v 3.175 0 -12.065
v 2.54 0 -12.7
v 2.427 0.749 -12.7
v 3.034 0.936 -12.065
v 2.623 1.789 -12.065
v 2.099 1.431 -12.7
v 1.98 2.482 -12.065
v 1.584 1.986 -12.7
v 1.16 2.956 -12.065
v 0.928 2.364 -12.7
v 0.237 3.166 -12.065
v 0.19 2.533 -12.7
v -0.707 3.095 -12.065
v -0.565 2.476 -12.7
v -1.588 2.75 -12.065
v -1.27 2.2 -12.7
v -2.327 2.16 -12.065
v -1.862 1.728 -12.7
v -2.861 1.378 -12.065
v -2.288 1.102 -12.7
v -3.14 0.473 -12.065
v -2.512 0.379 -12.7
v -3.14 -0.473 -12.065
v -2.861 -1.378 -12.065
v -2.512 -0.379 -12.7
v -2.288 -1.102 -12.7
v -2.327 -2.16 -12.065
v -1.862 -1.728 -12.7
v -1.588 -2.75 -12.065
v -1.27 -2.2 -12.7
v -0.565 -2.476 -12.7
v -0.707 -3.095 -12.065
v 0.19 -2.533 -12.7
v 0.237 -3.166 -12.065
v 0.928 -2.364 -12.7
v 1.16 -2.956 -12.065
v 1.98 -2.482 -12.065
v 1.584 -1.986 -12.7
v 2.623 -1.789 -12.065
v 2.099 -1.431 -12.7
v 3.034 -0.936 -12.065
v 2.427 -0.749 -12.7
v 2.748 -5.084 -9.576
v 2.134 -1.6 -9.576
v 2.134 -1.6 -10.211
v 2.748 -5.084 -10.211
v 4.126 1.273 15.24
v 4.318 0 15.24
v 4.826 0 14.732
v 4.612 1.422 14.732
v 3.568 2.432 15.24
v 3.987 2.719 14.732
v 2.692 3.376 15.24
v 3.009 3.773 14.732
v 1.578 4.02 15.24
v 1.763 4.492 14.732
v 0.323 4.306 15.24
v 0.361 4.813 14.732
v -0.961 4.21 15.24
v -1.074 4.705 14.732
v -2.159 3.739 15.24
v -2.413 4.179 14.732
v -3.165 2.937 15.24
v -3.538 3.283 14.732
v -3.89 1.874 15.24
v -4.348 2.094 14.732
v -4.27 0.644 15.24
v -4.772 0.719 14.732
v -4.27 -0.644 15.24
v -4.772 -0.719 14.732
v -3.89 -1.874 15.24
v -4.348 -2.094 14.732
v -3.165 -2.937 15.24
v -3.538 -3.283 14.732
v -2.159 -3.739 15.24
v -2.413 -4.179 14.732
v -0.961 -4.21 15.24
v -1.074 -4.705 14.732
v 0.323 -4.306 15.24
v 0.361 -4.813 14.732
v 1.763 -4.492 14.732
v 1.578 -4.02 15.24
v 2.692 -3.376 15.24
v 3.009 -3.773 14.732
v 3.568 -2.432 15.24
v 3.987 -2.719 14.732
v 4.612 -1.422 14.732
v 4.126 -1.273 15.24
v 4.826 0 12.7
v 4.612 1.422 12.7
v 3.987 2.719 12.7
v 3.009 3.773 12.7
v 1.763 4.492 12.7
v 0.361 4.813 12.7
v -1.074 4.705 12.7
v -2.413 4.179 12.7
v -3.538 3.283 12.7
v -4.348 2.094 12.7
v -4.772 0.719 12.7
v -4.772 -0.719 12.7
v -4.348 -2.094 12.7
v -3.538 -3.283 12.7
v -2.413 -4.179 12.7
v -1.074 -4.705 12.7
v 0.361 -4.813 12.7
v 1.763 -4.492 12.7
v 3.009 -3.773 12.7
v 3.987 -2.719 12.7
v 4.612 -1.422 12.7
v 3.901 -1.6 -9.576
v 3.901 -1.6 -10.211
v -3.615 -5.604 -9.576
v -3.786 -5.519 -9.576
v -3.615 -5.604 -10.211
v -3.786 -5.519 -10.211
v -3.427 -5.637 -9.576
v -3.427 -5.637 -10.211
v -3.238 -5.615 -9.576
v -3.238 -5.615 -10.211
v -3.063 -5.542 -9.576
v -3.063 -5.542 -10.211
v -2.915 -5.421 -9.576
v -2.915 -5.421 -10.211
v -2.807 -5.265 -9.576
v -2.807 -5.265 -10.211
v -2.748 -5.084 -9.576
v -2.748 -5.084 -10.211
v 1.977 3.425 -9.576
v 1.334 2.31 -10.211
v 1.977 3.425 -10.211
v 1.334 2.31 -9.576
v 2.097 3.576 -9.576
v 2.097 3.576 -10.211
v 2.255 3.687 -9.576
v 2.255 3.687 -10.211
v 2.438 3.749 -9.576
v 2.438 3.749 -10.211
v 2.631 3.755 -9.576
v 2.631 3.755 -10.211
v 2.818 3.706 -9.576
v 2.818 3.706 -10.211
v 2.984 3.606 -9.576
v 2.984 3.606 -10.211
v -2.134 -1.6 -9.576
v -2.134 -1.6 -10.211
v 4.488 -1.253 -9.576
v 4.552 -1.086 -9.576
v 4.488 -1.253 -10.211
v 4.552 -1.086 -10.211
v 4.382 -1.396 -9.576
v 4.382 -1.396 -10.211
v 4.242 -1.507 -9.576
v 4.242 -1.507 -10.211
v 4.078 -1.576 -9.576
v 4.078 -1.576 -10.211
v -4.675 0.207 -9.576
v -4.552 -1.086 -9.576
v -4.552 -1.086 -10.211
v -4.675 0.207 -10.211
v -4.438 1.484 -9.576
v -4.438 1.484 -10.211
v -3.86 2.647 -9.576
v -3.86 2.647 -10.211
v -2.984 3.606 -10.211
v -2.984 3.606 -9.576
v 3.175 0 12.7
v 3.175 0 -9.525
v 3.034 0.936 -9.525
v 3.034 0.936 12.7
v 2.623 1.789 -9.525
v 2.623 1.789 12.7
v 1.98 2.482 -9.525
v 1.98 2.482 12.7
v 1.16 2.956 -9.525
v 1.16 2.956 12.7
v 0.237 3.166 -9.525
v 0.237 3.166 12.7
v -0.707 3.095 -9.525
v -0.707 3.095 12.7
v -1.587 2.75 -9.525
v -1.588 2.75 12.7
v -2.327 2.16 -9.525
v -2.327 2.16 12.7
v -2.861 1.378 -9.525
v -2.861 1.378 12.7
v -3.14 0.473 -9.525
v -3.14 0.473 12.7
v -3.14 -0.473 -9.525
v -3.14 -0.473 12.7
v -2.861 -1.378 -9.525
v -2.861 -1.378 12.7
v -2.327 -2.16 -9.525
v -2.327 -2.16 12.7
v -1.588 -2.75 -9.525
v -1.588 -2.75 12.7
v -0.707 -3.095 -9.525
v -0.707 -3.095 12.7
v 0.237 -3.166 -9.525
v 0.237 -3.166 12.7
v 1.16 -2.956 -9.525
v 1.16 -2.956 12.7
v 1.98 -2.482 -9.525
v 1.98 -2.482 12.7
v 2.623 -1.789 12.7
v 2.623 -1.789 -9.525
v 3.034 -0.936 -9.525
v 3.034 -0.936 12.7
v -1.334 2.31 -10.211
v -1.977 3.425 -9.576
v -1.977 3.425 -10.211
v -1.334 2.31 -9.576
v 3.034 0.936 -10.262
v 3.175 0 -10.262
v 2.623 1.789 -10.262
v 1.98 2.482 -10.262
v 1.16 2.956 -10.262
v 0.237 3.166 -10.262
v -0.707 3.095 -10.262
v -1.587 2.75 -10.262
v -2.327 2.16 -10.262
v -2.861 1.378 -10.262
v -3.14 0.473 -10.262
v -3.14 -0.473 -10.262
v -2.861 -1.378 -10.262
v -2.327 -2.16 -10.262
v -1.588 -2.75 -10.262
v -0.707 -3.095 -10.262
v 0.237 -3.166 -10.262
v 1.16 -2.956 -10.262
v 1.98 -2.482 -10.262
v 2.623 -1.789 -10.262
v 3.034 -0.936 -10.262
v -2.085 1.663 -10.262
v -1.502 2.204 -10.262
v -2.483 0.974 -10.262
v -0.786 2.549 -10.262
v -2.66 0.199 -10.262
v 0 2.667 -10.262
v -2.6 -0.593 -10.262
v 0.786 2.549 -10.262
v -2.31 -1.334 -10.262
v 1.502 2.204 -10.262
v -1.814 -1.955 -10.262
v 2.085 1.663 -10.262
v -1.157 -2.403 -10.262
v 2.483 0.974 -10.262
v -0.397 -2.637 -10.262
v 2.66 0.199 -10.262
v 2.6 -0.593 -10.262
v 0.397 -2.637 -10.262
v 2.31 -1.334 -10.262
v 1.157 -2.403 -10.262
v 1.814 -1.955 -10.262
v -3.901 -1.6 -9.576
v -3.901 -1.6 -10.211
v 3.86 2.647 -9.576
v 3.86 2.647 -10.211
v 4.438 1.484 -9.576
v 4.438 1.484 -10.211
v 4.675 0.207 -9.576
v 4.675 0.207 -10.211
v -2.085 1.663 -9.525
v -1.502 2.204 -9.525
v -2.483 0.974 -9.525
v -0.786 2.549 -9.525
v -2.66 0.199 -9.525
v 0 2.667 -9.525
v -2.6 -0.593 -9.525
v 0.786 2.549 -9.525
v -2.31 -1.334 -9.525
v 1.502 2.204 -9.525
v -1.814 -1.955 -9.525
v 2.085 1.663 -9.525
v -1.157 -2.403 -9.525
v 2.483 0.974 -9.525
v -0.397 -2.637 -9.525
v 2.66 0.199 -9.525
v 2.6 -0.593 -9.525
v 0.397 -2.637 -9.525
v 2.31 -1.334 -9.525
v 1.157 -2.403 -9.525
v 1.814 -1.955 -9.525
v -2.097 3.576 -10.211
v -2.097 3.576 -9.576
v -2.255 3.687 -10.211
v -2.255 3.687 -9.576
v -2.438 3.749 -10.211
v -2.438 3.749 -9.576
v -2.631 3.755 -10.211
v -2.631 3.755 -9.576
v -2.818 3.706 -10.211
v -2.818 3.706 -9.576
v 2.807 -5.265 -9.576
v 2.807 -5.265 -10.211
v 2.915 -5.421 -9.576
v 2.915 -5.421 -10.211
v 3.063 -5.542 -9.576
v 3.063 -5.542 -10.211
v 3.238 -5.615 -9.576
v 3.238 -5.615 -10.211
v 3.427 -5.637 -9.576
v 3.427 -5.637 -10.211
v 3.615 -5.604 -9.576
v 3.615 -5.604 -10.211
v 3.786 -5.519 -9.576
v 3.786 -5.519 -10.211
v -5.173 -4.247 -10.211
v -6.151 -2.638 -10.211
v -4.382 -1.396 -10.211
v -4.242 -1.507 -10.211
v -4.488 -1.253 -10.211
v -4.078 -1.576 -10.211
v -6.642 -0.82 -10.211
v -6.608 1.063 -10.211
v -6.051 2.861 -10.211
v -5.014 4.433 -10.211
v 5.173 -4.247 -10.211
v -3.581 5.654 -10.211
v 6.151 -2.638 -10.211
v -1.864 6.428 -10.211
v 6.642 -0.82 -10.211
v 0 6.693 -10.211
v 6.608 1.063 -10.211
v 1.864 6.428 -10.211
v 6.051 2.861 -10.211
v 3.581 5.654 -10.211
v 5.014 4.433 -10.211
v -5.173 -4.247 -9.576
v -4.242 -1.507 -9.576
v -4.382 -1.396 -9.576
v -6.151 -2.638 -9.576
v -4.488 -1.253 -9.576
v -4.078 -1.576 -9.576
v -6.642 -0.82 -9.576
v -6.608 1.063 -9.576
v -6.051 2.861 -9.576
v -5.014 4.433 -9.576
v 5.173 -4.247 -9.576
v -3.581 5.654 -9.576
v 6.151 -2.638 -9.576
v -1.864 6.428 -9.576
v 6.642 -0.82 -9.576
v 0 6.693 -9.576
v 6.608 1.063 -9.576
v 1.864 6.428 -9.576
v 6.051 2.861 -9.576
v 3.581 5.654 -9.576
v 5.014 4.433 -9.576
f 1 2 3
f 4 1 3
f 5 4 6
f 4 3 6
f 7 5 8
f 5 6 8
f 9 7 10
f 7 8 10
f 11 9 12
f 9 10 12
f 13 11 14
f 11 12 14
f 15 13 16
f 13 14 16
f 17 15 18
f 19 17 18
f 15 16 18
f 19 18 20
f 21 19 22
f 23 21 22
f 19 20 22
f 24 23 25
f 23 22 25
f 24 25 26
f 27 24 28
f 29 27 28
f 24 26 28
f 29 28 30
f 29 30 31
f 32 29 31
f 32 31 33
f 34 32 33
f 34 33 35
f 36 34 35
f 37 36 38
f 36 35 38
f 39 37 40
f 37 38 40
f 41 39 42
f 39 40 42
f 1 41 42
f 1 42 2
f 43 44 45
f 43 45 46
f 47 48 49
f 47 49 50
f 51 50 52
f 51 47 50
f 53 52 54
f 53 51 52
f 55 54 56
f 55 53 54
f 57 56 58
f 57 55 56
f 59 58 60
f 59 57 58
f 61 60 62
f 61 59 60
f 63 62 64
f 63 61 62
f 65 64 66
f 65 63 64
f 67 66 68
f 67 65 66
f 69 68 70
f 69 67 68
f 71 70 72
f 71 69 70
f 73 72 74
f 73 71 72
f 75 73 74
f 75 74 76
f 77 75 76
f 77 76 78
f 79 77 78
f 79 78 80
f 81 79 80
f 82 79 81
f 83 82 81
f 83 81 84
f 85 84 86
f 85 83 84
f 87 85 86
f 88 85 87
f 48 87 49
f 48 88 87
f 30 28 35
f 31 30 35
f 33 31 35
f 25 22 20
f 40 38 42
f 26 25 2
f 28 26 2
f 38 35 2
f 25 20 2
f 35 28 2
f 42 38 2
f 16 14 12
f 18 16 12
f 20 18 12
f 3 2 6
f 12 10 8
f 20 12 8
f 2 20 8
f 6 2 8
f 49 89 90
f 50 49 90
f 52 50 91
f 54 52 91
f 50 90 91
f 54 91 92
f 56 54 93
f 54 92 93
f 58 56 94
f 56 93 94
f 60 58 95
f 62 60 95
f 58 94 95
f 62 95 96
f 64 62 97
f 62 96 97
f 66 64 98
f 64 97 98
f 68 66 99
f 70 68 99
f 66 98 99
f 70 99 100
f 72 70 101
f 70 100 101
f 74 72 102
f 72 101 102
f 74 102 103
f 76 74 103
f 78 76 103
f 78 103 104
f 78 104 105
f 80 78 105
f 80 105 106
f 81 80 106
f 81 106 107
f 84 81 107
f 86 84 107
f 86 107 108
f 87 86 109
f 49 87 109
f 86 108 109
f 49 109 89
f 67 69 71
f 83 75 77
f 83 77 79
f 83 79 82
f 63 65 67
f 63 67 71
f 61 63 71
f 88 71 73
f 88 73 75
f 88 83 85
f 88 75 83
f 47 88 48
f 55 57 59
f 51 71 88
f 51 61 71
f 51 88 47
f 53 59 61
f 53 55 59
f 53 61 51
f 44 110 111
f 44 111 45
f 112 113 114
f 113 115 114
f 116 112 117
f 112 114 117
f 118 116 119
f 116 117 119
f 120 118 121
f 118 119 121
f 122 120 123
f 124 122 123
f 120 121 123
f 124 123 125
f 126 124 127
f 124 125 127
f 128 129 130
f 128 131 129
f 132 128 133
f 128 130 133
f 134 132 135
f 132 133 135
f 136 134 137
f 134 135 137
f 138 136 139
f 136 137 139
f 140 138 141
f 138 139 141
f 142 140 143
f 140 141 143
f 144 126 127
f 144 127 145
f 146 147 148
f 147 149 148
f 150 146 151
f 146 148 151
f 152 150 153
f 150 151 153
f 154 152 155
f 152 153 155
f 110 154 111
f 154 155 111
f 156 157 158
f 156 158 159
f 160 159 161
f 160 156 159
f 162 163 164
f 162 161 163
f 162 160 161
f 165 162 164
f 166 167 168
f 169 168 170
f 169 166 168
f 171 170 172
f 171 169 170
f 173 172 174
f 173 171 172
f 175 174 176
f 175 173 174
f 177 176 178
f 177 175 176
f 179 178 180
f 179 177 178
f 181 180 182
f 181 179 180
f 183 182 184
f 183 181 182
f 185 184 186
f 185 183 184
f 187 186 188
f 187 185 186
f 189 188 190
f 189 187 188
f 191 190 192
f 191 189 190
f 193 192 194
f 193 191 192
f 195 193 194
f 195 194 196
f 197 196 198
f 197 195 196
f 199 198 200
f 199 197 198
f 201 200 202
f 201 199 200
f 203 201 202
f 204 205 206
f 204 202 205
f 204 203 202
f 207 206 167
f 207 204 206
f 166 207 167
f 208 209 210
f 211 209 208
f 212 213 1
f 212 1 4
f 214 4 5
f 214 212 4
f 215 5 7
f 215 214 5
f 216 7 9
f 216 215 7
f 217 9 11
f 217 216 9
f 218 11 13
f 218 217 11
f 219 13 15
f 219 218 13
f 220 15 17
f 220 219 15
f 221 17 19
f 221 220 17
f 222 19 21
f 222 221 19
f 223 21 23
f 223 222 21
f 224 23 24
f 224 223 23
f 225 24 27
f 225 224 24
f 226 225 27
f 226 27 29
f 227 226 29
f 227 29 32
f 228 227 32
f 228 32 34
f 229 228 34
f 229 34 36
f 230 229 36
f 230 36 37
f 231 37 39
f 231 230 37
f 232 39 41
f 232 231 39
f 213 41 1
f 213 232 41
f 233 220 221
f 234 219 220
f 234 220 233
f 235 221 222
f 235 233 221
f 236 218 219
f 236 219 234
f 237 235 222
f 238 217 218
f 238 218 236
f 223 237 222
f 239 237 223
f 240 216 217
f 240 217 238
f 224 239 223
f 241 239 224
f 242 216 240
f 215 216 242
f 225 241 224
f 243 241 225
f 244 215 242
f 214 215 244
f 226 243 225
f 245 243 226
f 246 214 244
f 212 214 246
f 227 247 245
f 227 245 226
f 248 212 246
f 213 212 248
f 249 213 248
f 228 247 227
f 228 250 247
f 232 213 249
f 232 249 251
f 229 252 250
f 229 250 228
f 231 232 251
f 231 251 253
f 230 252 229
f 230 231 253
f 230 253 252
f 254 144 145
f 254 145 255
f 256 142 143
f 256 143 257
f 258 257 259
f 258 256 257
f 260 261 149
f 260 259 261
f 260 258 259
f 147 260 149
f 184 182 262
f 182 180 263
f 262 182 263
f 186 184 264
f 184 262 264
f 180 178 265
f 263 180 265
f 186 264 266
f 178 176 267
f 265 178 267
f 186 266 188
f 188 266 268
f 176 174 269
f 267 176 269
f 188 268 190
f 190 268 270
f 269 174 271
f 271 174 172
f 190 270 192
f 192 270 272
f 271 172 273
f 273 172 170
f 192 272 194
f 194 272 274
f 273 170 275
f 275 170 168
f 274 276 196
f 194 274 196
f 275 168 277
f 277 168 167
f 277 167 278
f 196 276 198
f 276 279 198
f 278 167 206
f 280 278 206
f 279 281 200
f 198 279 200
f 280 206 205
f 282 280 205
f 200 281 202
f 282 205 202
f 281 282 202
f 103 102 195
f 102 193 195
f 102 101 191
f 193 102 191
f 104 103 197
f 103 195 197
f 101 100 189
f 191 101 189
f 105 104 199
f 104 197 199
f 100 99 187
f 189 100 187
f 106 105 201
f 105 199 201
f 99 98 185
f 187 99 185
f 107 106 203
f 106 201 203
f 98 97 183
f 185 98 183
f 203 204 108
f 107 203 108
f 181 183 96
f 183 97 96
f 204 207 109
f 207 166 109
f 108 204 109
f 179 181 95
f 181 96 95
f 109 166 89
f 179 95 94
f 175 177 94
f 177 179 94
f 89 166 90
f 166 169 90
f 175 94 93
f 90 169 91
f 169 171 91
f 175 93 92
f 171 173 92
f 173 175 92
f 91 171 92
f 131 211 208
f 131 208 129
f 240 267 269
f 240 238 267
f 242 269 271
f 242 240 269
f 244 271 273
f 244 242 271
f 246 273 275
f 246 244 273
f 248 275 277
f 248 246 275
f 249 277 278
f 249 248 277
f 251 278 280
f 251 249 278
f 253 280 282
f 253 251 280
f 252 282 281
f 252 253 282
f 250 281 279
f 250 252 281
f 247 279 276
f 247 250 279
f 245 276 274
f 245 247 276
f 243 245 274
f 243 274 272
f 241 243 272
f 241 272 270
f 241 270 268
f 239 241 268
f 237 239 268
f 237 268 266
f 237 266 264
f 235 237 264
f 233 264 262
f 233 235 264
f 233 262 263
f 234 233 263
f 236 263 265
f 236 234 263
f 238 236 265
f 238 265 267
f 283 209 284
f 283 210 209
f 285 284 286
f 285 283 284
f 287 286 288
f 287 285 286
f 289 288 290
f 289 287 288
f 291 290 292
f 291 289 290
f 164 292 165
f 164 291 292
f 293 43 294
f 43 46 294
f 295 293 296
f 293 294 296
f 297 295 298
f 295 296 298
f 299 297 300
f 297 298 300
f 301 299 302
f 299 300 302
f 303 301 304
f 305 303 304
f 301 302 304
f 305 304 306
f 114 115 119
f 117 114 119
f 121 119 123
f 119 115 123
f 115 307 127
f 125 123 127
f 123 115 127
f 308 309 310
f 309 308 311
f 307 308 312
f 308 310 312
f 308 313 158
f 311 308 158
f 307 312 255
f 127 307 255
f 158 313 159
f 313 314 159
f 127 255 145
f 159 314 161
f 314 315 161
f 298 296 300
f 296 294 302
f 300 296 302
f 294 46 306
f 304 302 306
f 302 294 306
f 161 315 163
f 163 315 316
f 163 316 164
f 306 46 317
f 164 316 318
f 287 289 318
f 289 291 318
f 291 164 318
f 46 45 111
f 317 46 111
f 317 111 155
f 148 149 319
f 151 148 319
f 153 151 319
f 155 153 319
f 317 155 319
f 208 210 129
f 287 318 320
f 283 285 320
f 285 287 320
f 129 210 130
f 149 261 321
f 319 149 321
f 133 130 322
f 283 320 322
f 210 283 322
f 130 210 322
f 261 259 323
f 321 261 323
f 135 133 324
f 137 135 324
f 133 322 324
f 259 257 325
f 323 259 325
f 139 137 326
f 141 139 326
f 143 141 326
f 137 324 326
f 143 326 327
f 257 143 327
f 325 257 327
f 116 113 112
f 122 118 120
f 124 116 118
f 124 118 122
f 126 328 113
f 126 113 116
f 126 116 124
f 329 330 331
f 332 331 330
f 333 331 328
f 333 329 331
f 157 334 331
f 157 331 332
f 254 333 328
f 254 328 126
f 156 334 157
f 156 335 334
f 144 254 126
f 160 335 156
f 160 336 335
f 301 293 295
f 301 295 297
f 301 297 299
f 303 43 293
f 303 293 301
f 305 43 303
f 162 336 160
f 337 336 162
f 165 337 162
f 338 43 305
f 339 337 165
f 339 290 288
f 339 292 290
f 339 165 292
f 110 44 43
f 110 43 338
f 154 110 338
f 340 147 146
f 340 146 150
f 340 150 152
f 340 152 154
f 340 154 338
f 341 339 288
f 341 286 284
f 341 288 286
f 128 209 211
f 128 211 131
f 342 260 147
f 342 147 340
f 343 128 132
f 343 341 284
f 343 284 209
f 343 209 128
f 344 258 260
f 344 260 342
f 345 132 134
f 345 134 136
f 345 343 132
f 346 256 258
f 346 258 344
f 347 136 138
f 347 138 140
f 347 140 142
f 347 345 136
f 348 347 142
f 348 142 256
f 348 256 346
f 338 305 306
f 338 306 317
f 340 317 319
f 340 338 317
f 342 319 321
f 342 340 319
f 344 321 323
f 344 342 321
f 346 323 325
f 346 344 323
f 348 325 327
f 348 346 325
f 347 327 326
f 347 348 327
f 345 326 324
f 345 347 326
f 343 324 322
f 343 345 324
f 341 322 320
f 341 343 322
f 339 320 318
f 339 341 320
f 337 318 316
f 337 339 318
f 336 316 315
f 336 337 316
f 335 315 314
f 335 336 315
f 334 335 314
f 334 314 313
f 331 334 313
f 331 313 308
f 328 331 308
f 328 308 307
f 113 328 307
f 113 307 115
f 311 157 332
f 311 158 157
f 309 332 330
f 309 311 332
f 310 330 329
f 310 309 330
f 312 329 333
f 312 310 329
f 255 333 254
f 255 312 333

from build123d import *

# Parameters (mm, degrees)
SKETCH2_R      = 3.175
EXTRUDE1_DEPTH = 12.7
SKETCH3_W      = 0.7366
SKETCH3_H      = 0.508
SKETCH8_R      = 4.826
EXTRUDE6_DEPTH = 2.54
CHAMFER2_SIZE  = 0.508
SKETCH4_R      = 6.6929
SKETCH4_R_2    = 2.667
EXTRUDE2_DEPTH = 0.3175
EXTRUDE4_DEPTH = 13.7
EXTRUDE5_DEPTH = 0.635
FILLET1_R      = 0.66929
CHAMFER1_SIZE  = 0.635


with BuildPart() as part:
    # Sketch2 → Extrude1 (new body, symmetric)
    with BuildSketch(Plane.XY):
        Circle(SKETCH2_R)
    extrude(amount=EXTRUDE1_DEPTH, both=True)

    # Sketch3 → Cut-Revolve1 (revolve, cut)
    with BuildSketch(Plane(origin=(0, 0, 0), x_dir=(0, 0, -1), z_dir=(1, 0, 0))):
        with Locations((9.8933, 2.921)):
            Rectangle(SKETCH3_W, SKETCH3_H)
    revolve(axis=Axis((0, 0, 12.7), (0, 0, -1)), mode=Mode.SUBTRACT)

    # Sketch8 → Extrude6 (add)
    with BuildSketch(Plane.XY.offset(12.7)):
        Circle(SKETCH8_R)
    extrude(amount=EXTRUDE6_DEPTH)

    # Chamfer2
    chamfer2_edges = [part.edges().sort_by_distance(p)[0] for p in [
        (-4.826, 0, 15.24),
    ]]
    chamfer(chamfer2_edges, length=CHAMFER2_SIZE)

    # Chamfer1
    chamfer1_edges = [part.edges().sort_by_distance(p)[0] for p in [
        (-3.175, 0, -12.7),
    ]]
    chamfer(chamfer1_edges, length=CHAMFER1_SIZE)


with BuildPart() as body_2:
    # Sketch4 → Extrude2 (new body, symmetric)
    with BuildSketch(Plane.XY.offset(-9.8933)):
        Circle(SKETCH4_R)
        Circle(SKETCH4_R_2, mode=Mode.SUBTRACT)
    extrude(amount=EXTRUDE2_DEPTH, both=True)

    # Sketch5 → Extrude4 (cut, through all)
    with BuildSketch(Plane.XY):
        with BuildLine():
            Line((-2.339975, 4.052955588), (0, 0))
            Line((0, 0), (2.339975, 4.052955588))
            ThreePointArc((2.339975, 4.052955588), (4.397634918, 1.600855749), (4.397873573, -1.6002))
            Line((4.397873573, -1.6002), (2.1336, -1.6002))
            Line((2.1336, -1.6002), (2.913865383, -6.025304883))
            ThreePointArc((2.913865383, -6.025304883), (0, -6.6929), (-2.913865383, -6.025304883))
            Line((-2.913865383, -6.025304883), (-2.1336, -1.6002))
            Line((-2.1336, -1.6002), (-4.397873573, -1.6002))
            ThreePointArc((-4.397873573, -1.6002), (-4.397634918, 1.600855749), (-2.339975, 4.052955588))
        make_face()
    extrude(amount=-EXTRUDE4_DEPTH, mode=Mode.SUBTRACT)

    # Sketch6 → Extrude5 (add)
    with BuildSketch(Plane.XY.offset(-9.5758)):
        with BuildLine():
            Line((-1.3335, 2.309689752), (1.3335, 2.309689752))
            ThreePointArc((1.3335, 2.309689752), (0, 2.667), (-1.3335, 2.309689752))
        make_face()
    extrude(amount=-EXTRUDE5_DEPTH)

    # Fillet1
    fillet1_edges = [body_2.edges().sort_by_distance(p)[0] for p in [
        (2.339975, 4.052955588, -9.8933),
        (2.913865383, -6.025304883, -9.8933),
        (-4.397873573, -1.6002, -9.8933),
        (4.397873573, -1.6002, -9.8933),
        (-2.913865383, -6.025304883, -9.8933),
        (-2.339975, 4.052955588, -9.8933),
    ]]
    fillet(fillet1_edges, radius=FILLET1_R)


solid = Compound([part.part, body_2.part])
